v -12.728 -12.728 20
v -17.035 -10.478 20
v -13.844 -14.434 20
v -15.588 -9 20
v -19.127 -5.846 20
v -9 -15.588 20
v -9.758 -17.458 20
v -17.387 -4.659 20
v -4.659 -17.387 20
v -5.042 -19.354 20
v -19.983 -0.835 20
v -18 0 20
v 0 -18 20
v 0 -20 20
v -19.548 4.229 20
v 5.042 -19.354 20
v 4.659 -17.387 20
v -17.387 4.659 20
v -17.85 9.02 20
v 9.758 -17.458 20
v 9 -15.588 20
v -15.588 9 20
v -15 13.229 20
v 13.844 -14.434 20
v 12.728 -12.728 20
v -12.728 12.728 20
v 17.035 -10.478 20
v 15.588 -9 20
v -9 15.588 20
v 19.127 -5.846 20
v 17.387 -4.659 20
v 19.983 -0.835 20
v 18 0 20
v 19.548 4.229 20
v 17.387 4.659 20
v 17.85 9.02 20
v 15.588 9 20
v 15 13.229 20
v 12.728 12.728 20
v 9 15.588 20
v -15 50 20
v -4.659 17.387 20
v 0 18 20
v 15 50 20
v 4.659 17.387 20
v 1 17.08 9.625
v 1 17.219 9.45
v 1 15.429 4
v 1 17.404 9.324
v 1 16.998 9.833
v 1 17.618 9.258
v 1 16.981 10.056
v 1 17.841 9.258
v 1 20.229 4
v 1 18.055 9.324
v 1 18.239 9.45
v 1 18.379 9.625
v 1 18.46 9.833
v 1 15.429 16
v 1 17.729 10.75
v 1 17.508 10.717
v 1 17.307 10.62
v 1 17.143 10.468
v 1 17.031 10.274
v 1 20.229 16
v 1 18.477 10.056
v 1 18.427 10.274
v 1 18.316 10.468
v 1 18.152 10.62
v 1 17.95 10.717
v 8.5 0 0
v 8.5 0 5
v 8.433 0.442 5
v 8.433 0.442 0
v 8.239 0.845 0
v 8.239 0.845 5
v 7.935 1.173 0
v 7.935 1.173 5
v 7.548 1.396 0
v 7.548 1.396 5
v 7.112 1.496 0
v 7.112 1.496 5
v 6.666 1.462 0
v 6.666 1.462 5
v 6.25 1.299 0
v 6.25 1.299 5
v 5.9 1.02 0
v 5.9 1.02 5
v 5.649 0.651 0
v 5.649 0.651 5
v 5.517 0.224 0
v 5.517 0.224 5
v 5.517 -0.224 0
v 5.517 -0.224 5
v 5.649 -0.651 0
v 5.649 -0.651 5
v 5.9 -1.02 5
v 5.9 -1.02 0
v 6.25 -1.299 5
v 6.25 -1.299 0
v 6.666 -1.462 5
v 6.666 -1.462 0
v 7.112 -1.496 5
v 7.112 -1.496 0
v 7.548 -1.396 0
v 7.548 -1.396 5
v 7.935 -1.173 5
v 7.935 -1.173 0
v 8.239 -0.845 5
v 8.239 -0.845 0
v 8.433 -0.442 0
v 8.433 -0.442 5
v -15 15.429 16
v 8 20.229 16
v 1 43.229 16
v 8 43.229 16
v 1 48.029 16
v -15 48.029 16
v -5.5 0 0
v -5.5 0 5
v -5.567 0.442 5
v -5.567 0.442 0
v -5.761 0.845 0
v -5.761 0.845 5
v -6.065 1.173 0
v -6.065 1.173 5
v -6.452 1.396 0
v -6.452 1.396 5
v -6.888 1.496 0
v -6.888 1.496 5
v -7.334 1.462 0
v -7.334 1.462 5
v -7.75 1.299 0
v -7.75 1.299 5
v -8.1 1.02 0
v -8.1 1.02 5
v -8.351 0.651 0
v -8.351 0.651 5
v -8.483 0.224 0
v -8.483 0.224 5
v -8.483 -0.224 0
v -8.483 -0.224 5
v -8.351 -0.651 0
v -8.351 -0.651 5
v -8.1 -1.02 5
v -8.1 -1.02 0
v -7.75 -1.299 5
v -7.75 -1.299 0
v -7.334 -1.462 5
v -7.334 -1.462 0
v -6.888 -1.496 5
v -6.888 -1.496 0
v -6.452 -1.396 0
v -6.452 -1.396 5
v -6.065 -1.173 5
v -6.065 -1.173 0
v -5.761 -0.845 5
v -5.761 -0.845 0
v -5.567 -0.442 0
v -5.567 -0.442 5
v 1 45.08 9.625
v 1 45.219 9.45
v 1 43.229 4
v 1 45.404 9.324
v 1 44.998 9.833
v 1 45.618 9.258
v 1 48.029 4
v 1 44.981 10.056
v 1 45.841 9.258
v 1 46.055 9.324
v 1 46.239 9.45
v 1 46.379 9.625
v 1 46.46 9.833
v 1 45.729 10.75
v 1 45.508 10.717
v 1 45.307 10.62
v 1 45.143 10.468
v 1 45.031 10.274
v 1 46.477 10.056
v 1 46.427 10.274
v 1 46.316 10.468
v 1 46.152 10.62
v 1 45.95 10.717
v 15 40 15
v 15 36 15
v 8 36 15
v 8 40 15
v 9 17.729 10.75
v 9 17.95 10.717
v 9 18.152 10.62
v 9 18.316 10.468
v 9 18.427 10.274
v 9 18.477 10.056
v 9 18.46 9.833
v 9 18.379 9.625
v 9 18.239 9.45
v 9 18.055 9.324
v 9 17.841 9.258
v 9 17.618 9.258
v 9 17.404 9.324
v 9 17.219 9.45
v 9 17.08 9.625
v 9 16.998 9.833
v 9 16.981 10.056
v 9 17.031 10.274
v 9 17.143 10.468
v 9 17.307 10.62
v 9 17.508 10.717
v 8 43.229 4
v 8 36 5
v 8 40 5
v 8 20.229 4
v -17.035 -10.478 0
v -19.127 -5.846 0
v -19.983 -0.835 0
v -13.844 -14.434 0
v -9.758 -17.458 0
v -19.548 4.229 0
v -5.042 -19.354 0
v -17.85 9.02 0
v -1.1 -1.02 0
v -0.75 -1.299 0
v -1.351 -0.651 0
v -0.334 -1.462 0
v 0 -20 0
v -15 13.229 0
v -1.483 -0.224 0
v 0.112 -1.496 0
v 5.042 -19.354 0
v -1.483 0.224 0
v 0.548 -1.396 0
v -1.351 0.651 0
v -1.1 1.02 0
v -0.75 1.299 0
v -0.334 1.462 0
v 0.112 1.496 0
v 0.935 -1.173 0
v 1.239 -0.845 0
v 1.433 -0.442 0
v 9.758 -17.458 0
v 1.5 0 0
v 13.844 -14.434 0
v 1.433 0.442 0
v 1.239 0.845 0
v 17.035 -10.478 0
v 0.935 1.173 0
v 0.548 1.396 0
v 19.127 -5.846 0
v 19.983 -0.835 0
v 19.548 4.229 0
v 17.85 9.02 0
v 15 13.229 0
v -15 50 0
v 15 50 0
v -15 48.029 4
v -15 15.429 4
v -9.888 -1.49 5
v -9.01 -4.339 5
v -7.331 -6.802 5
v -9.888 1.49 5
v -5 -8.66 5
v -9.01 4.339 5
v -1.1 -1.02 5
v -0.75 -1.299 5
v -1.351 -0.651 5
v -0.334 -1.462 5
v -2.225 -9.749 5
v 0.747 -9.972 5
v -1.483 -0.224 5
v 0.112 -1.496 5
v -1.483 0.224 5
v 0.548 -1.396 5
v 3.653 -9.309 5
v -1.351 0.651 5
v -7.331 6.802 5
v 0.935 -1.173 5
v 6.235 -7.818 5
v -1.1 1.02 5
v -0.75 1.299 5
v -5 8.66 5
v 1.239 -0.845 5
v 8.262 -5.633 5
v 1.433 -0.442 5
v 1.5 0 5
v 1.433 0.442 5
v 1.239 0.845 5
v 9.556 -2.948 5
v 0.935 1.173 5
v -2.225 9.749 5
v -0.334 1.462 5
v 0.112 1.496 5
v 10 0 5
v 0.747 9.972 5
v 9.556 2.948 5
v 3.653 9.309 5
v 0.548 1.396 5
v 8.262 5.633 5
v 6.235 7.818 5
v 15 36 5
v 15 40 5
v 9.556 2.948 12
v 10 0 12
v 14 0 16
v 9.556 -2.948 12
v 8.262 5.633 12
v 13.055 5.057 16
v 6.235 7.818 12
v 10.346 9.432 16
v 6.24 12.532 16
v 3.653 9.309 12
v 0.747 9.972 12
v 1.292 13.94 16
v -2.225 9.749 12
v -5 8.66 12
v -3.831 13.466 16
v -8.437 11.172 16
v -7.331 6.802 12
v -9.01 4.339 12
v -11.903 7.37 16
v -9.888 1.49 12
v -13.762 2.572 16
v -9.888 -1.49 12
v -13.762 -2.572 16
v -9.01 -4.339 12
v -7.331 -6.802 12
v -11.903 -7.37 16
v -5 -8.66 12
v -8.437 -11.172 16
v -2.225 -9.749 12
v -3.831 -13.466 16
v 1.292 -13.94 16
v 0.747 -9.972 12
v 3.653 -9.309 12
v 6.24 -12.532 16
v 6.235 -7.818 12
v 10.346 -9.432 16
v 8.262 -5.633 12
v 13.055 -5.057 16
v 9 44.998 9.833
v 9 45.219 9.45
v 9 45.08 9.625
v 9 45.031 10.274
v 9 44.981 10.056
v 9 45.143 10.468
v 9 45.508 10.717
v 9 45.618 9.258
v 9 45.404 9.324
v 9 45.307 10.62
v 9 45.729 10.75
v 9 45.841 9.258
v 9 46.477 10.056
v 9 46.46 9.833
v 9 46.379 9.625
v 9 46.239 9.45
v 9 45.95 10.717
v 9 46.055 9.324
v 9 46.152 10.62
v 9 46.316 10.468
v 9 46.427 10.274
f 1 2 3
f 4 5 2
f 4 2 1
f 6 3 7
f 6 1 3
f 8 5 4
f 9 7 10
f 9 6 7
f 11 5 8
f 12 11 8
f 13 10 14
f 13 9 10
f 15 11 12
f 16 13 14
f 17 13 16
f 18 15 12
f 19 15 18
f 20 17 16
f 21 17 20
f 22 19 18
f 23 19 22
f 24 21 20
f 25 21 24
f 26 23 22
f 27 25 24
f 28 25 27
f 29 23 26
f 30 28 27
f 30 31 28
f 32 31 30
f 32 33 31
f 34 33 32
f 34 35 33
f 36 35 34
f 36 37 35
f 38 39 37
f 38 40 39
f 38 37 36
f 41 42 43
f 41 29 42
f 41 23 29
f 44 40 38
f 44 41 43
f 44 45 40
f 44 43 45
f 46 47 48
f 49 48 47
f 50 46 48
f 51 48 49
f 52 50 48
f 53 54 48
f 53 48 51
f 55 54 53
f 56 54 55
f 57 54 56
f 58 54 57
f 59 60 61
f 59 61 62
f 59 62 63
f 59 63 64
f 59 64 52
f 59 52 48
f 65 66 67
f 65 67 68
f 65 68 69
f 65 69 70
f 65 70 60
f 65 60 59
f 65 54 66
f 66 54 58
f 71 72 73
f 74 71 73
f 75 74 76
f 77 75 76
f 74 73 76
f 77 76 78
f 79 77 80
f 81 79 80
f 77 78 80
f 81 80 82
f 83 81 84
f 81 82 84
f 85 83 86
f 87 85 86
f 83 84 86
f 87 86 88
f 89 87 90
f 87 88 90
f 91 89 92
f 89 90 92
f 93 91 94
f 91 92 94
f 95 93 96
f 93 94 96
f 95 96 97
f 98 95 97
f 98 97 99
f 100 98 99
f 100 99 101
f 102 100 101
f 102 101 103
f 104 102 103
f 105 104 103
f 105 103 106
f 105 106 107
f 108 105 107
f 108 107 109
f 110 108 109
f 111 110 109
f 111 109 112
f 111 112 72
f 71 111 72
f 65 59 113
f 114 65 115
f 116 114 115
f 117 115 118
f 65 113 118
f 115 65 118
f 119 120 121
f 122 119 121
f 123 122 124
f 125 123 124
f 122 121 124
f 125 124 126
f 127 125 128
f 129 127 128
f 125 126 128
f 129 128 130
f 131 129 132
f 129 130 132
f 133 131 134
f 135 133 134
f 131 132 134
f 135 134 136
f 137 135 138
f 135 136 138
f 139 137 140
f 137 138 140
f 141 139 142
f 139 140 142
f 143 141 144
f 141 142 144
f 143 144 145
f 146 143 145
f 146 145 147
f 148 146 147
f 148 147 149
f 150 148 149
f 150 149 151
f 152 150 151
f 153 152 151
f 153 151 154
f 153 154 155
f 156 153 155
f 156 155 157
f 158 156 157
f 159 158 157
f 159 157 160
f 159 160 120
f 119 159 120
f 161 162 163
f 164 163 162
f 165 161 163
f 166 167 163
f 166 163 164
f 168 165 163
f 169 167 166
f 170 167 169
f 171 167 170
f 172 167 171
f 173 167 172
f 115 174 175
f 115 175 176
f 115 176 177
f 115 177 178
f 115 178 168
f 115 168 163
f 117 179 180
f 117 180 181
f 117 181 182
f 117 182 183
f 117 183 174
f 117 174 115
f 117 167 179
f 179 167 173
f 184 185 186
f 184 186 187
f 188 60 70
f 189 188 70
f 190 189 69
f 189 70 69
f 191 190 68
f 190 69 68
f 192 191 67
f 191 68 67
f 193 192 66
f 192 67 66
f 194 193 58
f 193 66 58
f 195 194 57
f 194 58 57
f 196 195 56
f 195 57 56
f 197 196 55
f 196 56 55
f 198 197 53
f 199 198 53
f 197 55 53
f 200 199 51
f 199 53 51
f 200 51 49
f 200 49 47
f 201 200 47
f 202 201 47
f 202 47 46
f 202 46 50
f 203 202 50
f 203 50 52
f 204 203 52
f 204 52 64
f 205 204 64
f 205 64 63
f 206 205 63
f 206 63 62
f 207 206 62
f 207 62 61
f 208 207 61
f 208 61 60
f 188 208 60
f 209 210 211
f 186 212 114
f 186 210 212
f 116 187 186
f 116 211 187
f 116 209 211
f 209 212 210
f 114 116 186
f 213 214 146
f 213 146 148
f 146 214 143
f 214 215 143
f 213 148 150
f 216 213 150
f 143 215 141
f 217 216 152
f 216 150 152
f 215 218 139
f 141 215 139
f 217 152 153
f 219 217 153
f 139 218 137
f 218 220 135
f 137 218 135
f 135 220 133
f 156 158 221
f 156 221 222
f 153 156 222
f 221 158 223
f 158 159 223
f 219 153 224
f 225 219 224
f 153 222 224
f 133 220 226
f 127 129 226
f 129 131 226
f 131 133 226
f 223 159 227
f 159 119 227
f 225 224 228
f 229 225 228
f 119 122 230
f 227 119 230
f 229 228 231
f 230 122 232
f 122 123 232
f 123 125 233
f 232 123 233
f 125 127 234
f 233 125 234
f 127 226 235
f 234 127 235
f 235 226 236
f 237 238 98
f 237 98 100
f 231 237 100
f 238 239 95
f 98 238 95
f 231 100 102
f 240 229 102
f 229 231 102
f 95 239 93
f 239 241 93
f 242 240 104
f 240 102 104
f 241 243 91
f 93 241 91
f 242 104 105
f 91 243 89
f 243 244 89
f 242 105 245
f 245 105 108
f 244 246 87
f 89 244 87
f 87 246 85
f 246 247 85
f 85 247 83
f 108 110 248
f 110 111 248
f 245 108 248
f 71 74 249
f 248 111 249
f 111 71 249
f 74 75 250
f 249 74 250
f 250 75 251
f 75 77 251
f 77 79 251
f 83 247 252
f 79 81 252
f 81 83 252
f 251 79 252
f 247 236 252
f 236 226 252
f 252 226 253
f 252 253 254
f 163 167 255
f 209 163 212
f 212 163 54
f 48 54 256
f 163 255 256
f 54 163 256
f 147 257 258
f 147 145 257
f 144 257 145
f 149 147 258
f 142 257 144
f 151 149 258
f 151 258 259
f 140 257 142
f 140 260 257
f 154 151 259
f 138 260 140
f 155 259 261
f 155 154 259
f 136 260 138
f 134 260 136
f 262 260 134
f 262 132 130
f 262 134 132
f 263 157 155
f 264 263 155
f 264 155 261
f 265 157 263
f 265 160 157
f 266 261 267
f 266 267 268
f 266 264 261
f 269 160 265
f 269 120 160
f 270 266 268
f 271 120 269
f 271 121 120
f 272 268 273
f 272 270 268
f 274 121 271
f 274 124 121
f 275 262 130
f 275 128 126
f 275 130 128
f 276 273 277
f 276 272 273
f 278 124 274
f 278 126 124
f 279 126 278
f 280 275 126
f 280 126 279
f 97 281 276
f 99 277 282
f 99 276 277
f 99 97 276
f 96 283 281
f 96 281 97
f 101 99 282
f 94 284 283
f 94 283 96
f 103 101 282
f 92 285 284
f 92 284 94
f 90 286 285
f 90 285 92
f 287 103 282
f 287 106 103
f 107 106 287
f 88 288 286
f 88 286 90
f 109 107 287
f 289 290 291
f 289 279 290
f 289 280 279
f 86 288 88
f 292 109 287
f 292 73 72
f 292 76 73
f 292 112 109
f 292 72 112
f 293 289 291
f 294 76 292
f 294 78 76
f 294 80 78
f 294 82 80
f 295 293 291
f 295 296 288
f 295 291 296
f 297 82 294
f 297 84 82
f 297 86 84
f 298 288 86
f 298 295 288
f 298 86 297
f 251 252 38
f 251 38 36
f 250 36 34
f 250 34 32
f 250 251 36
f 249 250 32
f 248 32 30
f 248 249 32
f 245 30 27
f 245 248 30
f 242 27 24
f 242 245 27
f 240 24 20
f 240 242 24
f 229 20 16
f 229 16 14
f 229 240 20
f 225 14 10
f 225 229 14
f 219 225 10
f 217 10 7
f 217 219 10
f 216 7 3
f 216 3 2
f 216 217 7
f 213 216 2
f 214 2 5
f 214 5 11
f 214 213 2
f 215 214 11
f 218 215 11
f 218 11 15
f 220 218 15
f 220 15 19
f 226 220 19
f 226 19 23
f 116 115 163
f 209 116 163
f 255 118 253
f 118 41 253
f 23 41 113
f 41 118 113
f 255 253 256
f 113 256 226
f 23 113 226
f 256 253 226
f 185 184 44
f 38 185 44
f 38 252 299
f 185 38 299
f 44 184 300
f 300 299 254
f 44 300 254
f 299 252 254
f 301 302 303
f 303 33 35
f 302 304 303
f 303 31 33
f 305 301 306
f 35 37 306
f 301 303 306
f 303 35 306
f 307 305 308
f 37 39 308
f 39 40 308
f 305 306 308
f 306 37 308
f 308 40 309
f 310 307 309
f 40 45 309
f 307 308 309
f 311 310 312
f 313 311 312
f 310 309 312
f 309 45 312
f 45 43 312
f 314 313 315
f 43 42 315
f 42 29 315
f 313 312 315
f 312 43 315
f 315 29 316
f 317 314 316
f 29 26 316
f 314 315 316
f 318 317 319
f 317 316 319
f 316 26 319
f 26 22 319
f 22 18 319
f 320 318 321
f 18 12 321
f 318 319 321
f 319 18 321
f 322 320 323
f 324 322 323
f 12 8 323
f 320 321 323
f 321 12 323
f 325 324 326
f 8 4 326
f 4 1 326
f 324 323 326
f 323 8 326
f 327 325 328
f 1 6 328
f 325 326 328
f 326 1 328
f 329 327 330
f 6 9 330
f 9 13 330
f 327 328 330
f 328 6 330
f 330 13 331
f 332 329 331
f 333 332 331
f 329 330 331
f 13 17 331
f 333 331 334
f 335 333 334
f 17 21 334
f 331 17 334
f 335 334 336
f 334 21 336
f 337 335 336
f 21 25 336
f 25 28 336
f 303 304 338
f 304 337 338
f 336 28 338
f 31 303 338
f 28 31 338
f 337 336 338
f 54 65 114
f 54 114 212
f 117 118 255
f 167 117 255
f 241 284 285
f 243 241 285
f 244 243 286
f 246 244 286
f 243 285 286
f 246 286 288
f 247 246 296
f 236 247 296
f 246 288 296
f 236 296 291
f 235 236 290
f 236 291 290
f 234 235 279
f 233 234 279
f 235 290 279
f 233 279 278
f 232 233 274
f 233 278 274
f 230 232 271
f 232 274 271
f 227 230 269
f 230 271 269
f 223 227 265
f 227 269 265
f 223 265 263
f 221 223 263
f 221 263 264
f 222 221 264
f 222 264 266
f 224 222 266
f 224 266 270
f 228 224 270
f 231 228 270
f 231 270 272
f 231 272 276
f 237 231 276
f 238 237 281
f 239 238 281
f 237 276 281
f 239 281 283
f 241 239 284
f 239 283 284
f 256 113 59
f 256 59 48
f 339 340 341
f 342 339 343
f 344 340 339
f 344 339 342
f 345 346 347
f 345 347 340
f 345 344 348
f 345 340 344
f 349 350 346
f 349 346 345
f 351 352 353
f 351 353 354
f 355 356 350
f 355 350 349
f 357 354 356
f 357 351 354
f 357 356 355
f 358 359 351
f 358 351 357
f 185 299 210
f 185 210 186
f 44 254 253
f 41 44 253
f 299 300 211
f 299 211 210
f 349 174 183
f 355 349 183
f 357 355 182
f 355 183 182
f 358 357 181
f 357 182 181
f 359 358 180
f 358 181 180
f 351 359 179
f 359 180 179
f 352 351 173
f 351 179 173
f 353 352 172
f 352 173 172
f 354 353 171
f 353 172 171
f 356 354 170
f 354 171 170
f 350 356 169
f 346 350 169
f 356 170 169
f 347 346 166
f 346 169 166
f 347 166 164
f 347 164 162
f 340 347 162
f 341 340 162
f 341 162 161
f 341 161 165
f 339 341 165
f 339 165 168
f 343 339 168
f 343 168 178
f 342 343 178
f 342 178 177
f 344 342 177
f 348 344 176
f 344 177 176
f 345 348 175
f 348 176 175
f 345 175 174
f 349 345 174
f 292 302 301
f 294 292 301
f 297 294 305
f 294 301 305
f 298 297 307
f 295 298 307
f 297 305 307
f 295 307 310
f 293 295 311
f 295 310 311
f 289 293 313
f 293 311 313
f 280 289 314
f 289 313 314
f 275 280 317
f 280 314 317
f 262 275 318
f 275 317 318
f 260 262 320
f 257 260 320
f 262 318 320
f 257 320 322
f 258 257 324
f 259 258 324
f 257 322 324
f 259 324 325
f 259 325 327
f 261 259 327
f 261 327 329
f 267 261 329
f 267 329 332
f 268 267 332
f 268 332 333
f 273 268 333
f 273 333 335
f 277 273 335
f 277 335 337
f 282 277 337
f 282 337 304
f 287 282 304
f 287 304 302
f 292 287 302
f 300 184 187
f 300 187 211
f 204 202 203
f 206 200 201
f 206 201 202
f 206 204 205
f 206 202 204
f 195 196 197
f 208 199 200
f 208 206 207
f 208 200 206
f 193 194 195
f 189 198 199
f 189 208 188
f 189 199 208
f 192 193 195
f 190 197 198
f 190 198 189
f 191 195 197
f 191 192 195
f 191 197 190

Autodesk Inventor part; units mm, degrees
ref_plane "YZ Plane" through (0, 0, 0) normal (1, 0, 0) x (0, 1, 0)
ref_plane "XZ Plane" through (0, 0, 0) normal (0, 1, 0) x (-1, 0, 0)
ref_plane "XY Plane" through (0, 0, 0) normal (0, 0, 1) x (1, 0, 0)
sketch "Sketch1" plane through (0, 0, 0) normal (0, 0, 1) x (1, 0, 0)
  circle A0 centre (0, 0) radius 10
  circle A1 centre (0, 0) radius 20
  line L0 (-15, 0) -> (15, 0)
  line L1 (15, 0) -> (15, 50)
  line L2 (15, 50) -> (-15, 50)
  line L3 (-15, 50) -> (-15, 0)
  point P0 (-15, 13.2288)
  point P1 (15, 13.2288)
  dimension "d0" = 20
  dimension "d1" = 40
  dimension "d2" = 30
  dimension "d3" = 50
extrude "Extrusion1" add sketch "Sketch1" along normal blind 20
sketch "Sketch2" plane through (0, 0, 20) normal (0, 0, 1) x (1, 0, 0)
  circle A0 centre (0, 0) radius 10
  dimension "d6" = 20
extrude "Extrusion2" cut sketch "Sketch2" against normal blind 15
sketch "Sketch3" plane through (0, 0, 20) normal (0, 0, 1) x (1, 0, 0)
  circle A0 centre (0, 0) radius 10 projected
  line L0 (0, 0) -> (6, 0)
  line L1 (6, 0) -> (6, 17)
  line L2 (6, 17) -> (0, 17)
  line L3 (0, 17) -> (0, 0)
  line L4 (0, 0) -> (-6, 0)
  line L5 (-6, 0) -> (-6, 17)
  line L6 (-6, 17) -> (0, 17)
  line L7 (0, 17) -> (0, 0)
  dimension "d9" = 6
  dimension "d10" = 17
  dimension "d11" = 6
  dimension "d12" = 17
sketch "Sketch4" plane through (-15, 13.2288, 0) normal (-1, 0, 0) x (0, 0, 1)
  line L0 (0, 36.7712) -> (20, 36.7712) projected
  line L1 (0, 0) -> (0, 36.7712) projected
  line L2 (20, 36.7712) -> (0, 36.7712)
  line L3 (0, 36.7712) -> (0, 0)
  line L4 (0, 0) -> (20, 0)
  line L5 (20, 0) -> (20, 36.7712)
  line L6 (0, 0) -> (20, 0) projected
  line L7 (20, 36.7712) -> (10, 36.7712)
  line L8 (10, 36.7712) -> (10, 0)
  line L9 (10, 0) -> (20, 0)
  line L10 (20, 0) -> (20, 36.7712)
  line L11 (10, 0) -> (16, 0)
  line L12 (16, 0) -> (16, 25)
  line L13 (16, 25) -> (10, 25)
  line L14 (10, 25) -> (10, 0)
  line L15 (10, 25) -> (4, 25)
  line L16 (4, 25) -> (4, 0)
  line L17 (4, 0) -> (10, 0)
  line L18 (10, 0) -> (10, 25)
  line L19 (4, 25) -> (16, 25)
  line L20 (16, 25) -> (16, 30.0005)
  line L21 (16, 30.0005) -> (4, 30.0005)
  line L22 (4, 30.0005) -> (4, 25)
  line L23 (4, 30.0005) -> (16, 30.0005)
  line L24 (16, 30.0005) -> (16, 7.0005)
  line L25 (16, 7.0005) -> (4, 7.0005)
  line L26 (4, 7.0005) -> (4, 30.0005)
  line L27 (10, 7.0005) -> (16, 7.0005)
  line L28 (16, 7.0005) -> (16, 0)
  line L29 (16, 0) -> (10, 0)
  line L30 (10, 0) -> (10, 7.0005)
  point P0 (0, -13.2288)
  dimension "d13" = 6
  dimension "d14" = 25
  dimension "d15" = 6
  dimension "d16" = 23
extrude "Extrusion3" cut sketch "Sketch4" against normal blind 23 contours L21 L20 L13 L8 | L8 L15 L22 L21 | L13 L12 L25 L8 | L8 L25 L16 L15
sketch "Sketch5" plane through (8, 13.2288, 0) normal (-1, 0, 0) x (0, 0, 1)
  point P0 (0, -13.2288)
sketch "Sketch6" plane through (-15, 13.2288, 0) normal (-1, 0, 0) x (0, 0, 1)
  line L0 (4, 7.0005) -> (4, 30.0005) projected
  line L1 (4, 7.0005) -> (16, 7.0005)
  line L2 (16, 7.0005) -> (16, 2.2005)
  line L3 (16, 2.2005) -> (4, 2.2005)
  line L4 (4, 2.2005) -> (4, 7.0005)
  line L5 (4, 30.0005) -> (16, 30.0005)
  line L6 (16, 30.0005) -> (16, 34.8005)
  line L7 (16, 34.8005) -> (4, 34.8005)
  line L8 (4, 34.8005) -> (4, 30.0005)
  point P0 (0, -13.2288)
  dimension "d19" = 12
  dimension "d20" = 4.8
  dimension "d21" = 4.8
extrude "Extrusion4" cut sketch "Sketch6" against normal blind 16
sketch "Sketch7" plane through (1, 13.2288, 0) normal (-1, 0, 0) x (0, 0, 1)
  line L0 (4, 30.0005) -> (16, 30.0005) projected
  line L1 (4, 30.0005) -> (10, 30.0005)
  line L2 (10, 30.0005) -> (10, 32.5005)
  line L3 (10, 32.5005) -> (4, 32.5005)
  line L4 (4, 32.5005) -> (4, 30.0005)
  circle A0 centre (10, 32.5005) radius 0.75
  line L5 (16, 7.0005) -> (4, 7.0005) projected
  line L6 (16, 7.0005) -> (16, 2.2005) projected
  line L7 (4, 7.0005) -> (16, 7.0005)
  line L8 (16, 7.0005) -> (16, 4.5005)
  line L9 (16, 4.5005) -> (4, 4.5005)
  line L10 (4, 4.5005) -> (4, 7.0005)
  line L11 (10, 4.5005) -> (4, 4.5005)
  line L12 (4, 4.5005) -> (4, 7.0005)
  line L13 (4, 7.0005) -> (10, 7.0005)
  line L14 (10, 7.0005) -> (10, 4.5005)
  circle A1 centre (10, 4.5005) radius 0.75
  point P0 (0, -13.2288)
  dimension "d24" = 2.5
  dimension "d25" = 1.5
  dimension "d26" = 2.5
  dimension "d27" = 1.5
extrude "Extrusion5" cut sketch "Sketch7" against normal blind 8 contours A0 L3 L2 | L2 L3 A0 | A1 L9 L14 | L14 L9 A1 | A1 L9
sketch "Sketch8" plane through (15, 13.2288, 0) normal (1, 0, 0) x (0, 0, -1)
  line L0 (0, 36.7712) -> (0, 0) projected
  line L1 (-20, 36.7712) -> (-20, 0) projected
  line L2 (0, 36.7712) -> (-20, 36.7712)
  line L3 (-20, 36.7712) -> (-20, 26.7712)
  line L4 (-20, 26.7712) -> (0, 26.7712)
  line L5 (0, 26.7712) -> (0, 36.7712)
  line L6 (0, 26.7712) -> (-20, 26.7712)
  line L7 (-20, 26.7712) -> (-20, 18.7712)
  line L8 (-20, 18.7712) -> (0, 18.7712)
  line L9 (0, 18.7712) -> (0, 26.7712)
  line L10 (0, 26.7712) -> (-10, 26.7712)
  line L11 (-10, 26.7712) -> (-10, 18.7712)
  line L12 (-10, 18.7712) -> (0, 18.7712)
  line L13 (0, 18.7712) -> (0, 26.7712)
  line L14 (-10, 26.7712) -> (-5, 26.7712)
  line L15 (-5, 26.7712) -> (-5, 22.7712)
  line L16 (-5, 22.7712) -> (-10, 22.7712)
  line L17 (-10, 22.7712) -> (-10, 26.7712)
  line L18 (-10, 22.7712) -> (-15, 22.7712)
  line L19 (-15, 22.7712) -> (-15, 26.7712)
  line L20 (-15, 26.7712) -> (-10, 26.7712)
  line L21 (-10, 26.7712) -> (-10, 22.7712)
  point P0 (0, -13.2288)
  dimension "d30" = 10
  dimension "d31" = 8
  dimension "d32" = 5
  dimension "d33" = 5
extrude "Extrusion6" cut sketch "Sketch8" against normal blind 15.8125 contours L15 L16 L11 L4 | L11 L18 L19 L4
sketch "Sketch9" plane through (0, 0, 5) normal (0, 0, 1) x (1, 0, 0)
  circle A0 centre (0, 0) radius 1
  circle A1 centre (7, 0) radius 1.5
  circle A2 centre (0, 0) radius 1.5
  circle A3 centre (-7, 0) radius 1.5
  dimension "d36" = 2
  dimension "d37" = 3
  dimension "d38" = 3
  dimension "d39" = 3
extrude "Extrusion7" cut sketch "Sketch9" against normal blind 8 contours A0 | A1 | A2 | A3
chamfer "Chamfer1" distance 8 angle 45 1 edges at (-10, 0, 20)
properties part number "EndConnector"
